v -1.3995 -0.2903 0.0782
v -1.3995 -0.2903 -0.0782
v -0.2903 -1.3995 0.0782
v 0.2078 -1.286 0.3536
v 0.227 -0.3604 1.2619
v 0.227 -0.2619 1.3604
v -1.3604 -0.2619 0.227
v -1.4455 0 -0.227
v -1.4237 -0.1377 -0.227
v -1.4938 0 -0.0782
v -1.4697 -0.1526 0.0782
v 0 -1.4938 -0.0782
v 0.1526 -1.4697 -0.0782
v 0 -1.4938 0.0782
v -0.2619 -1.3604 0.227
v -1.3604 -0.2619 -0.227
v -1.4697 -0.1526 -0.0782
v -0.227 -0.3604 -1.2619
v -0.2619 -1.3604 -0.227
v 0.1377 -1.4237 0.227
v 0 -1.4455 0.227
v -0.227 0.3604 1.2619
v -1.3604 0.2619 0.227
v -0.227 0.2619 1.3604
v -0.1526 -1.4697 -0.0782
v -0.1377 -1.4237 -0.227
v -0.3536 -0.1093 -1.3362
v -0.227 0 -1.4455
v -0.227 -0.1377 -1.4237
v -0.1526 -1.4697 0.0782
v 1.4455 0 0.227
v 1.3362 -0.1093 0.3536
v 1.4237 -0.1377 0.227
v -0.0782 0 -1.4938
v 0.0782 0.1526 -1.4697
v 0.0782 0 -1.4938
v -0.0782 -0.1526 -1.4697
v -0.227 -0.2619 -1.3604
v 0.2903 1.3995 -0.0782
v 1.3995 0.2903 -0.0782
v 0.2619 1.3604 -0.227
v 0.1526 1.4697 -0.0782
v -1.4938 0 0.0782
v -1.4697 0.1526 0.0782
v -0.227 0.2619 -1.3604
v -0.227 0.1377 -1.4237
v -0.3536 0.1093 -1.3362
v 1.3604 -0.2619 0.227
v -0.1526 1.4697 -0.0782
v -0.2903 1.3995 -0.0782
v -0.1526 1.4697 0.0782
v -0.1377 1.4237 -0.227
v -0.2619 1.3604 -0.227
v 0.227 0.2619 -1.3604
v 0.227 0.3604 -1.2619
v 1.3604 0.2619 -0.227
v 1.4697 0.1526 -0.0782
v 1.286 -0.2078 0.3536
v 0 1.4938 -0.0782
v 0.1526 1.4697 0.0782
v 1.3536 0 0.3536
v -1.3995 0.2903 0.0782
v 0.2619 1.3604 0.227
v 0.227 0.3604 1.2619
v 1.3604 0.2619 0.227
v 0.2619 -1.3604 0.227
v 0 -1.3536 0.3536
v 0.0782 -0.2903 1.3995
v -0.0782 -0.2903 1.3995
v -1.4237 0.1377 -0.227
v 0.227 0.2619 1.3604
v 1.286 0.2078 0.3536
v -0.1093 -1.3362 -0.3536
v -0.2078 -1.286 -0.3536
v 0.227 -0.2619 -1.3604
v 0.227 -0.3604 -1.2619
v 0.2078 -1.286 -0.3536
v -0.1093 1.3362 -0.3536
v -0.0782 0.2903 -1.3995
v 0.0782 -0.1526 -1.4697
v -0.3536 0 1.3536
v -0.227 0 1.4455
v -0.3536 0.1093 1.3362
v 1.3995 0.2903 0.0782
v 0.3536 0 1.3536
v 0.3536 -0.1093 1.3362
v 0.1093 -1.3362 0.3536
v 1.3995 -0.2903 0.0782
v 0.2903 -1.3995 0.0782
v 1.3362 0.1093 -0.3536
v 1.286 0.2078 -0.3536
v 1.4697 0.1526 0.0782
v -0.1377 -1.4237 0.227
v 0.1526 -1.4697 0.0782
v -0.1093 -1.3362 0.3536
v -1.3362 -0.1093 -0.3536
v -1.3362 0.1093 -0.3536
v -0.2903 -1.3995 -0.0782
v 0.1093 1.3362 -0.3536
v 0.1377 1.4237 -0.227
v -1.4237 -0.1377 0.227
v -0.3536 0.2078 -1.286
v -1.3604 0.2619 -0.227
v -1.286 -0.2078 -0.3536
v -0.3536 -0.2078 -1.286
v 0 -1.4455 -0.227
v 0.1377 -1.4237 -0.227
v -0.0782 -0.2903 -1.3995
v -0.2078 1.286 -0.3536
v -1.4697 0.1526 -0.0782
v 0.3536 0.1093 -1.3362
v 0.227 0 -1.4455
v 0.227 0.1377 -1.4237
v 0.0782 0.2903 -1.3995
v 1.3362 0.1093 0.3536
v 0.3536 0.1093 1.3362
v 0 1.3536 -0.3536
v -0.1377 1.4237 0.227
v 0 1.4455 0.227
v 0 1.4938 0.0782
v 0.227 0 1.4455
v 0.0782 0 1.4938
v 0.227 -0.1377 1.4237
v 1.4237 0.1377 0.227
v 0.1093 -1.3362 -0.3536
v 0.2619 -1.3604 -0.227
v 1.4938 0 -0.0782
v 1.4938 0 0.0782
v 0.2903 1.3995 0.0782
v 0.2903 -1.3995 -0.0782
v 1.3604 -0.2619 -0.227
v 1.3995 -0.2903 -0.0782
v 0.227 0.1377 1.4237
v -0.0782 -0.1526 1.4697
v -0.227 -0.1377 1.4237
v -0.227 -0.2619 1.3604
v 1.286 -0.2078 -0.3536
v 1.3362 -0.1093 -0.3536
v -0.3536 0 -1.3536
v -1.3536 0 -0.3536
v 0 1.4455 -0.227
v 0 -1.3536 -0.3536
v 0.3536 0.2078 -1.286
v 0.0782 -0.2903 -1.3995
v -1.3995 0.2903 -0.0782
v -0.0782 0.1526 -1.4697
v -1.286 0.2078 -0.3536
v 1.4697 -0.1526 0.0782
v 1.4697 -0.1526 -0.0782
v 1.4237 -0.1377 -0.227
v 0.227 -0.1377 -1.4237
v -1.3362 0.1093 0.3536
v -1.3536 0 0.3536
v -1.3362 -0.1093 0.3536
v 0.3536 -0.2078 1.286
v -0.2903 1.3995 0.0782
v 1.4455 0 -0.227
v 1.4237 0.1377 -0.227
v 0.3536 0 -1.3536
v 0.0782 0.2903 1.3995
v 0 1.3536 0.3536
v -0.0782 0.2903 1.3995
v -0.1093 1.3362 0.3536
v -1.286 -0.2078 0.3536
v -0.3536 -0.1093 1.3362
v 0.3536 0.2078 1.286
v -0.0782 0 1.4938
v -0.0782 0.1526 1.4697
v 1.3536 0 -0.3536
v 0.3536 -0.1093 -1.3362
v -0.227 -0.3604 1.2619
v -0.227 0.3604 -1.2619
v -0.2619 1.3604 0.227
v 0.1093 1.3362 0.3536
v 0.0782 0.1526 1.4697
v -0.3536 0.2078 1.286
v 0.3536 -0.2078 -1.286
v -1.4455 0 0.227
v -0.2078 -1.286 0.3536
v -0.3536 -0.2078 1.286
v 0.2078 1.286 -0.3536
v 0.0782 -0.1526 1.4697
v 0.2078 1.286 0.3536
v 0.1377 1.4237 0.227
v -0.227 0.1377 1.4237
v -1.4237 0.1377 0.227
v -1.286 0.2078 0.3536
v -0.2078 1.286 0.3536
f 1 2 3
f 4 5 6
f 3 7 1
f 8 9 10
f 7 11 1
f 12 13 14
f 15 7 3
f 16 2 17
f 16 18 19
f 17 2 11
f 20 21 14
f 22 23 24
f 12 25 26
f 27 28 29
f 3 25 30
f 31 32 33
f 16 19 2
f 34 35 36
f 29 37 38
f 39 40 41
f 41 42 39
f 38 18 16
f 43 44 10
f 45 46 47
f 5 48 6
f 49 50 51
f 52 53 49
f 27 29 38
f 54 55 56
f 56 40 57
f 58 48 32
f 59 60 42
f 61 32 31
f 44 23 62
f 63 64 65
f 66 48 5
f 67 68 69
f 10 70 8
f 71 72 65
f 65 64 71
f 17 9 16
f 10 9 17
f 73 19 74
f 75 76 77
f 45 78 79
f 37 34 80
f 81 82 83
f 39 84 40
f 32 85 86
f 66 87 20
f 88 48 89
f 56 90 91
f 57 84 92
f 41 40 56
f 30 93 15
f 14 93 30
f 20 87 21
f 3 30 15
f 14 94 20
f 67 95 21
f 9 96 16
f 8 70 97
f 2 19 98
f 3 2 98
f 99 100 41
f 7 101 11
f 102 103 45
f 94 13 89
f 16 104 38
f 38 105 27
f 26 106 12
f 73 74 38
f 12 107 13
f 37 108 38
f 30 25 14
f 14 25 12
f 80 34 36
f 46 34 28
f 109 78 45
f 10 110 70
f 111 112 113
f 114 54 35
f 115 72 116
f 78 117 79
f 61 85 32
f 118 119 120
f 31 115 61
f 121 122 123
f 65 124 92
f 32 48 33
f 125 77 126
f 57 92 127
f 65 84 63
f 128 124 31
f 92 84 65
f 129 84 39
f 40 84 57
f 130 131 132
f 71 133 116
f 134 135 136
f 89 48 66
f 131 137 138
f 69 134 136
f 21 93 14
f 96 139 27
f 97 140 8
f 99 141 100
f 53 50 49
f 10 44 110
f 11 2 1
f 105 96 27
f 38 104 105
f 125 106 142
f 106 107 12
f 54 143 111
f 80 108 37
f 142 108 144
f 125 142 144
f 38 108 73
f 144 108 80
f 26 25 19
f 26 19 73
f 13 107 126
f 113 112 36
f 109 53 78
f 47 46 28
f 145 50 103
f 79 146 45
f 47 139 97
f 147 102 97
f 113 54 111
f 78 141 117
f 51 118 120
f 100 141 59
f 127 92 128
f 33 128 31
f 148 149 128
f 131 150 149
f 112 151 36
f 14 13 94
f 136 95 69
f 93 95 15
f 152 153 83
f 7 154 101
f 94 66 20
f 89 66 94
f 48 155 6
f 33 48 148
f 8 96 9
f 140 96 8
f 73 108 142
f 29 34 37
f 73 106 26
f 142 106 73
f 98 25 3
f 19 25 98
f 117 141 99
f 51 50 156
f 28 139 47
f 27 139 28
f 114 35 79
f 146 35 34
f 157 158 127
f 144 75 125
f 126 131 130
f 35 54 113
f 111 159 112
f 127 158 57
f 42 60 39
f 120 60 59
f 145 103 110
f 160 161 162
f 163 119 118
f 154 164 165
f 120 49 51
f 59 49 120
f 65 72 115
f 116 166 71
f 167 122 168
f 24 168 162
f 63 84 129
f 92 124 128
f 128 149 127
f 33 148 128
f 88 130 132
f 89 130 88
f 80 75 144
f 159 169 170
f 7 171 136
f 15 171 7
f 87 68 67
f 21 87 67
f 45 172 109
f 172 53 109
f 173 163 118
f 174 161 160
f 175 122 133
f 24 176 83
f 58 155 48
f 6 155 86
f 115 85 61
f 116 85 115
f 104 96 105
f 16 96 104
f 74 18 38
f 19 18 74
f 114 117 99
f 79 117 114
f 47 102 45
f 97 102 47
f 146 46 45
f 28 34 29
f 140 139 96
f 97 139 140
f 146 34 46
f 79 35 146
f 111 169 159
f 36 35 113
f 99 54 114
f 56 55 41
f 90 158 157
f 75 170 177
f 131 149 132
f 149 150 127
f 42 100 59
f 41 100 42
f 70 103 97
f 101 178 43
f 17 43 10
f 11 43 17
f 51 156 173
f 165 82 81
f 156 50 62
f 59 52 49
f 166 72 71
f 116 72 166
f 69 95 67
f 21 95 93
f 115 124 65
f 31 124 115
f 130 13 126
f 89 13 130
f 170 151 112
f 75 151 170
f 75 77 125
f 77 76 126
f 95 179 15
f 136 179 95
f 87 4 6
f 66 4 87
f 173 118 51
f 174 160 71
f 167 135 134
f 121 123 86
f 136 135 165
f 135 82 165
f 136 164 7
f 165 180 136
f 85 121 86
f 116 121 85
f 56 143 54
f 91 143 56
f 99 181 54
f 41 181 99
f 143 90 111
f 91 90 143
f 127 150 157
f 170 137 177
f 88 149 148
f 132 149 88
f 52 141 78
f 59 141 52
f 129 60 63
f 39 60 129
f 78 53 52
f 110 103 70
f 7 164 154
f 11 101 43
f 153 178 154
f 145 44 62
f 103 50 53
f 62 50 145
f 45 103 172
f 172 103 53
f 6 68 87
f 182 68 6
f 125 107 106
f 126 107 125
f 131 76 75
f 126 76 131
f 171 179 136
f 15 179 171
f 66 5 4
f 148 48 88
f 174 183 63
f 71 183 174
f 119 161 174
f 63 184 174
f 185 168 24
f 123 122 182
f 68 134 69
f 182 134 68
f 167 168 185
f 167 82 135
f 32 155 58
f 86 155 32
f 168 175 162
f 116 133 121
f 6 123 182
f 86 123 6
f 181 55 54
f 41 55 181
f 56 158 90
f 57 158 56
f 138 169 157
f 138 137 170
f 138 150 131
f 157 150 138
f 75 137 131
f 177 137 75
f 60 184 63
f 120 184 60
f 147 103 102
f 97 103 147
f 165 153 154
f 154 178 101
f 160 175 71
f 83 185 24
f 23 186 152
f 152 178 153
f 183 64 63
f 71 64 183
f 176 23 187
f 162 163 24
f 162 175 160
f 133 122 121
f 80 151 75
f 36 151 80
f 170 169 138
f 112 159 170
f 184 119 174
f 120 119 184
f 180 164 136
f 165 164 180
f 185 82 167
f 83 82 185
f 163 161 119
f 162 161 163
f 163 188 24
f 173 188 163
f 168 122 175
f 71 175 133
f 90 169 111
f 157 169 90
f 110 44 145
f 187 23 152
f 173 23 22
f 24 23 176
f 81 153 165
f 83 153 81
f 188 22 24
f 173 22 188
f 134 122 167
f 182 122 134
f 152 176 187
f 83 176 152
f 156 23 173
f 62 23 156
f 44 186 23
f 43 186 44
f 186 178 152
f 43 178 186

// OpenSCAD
module cube_()
  hull()for (x=[-1,1])for(y=[-1,1])for(z=[-1,1])translate([x,y,z])sphere(0.5,$fn=20);
module octaeder()
  hull()for(a = [[0,0,0],[0,90,0],[0,0,90]])rotate(a)for(x=[-1,1])translate([x,0,0])sphere(0.5,$fn=20);
octaeder();
